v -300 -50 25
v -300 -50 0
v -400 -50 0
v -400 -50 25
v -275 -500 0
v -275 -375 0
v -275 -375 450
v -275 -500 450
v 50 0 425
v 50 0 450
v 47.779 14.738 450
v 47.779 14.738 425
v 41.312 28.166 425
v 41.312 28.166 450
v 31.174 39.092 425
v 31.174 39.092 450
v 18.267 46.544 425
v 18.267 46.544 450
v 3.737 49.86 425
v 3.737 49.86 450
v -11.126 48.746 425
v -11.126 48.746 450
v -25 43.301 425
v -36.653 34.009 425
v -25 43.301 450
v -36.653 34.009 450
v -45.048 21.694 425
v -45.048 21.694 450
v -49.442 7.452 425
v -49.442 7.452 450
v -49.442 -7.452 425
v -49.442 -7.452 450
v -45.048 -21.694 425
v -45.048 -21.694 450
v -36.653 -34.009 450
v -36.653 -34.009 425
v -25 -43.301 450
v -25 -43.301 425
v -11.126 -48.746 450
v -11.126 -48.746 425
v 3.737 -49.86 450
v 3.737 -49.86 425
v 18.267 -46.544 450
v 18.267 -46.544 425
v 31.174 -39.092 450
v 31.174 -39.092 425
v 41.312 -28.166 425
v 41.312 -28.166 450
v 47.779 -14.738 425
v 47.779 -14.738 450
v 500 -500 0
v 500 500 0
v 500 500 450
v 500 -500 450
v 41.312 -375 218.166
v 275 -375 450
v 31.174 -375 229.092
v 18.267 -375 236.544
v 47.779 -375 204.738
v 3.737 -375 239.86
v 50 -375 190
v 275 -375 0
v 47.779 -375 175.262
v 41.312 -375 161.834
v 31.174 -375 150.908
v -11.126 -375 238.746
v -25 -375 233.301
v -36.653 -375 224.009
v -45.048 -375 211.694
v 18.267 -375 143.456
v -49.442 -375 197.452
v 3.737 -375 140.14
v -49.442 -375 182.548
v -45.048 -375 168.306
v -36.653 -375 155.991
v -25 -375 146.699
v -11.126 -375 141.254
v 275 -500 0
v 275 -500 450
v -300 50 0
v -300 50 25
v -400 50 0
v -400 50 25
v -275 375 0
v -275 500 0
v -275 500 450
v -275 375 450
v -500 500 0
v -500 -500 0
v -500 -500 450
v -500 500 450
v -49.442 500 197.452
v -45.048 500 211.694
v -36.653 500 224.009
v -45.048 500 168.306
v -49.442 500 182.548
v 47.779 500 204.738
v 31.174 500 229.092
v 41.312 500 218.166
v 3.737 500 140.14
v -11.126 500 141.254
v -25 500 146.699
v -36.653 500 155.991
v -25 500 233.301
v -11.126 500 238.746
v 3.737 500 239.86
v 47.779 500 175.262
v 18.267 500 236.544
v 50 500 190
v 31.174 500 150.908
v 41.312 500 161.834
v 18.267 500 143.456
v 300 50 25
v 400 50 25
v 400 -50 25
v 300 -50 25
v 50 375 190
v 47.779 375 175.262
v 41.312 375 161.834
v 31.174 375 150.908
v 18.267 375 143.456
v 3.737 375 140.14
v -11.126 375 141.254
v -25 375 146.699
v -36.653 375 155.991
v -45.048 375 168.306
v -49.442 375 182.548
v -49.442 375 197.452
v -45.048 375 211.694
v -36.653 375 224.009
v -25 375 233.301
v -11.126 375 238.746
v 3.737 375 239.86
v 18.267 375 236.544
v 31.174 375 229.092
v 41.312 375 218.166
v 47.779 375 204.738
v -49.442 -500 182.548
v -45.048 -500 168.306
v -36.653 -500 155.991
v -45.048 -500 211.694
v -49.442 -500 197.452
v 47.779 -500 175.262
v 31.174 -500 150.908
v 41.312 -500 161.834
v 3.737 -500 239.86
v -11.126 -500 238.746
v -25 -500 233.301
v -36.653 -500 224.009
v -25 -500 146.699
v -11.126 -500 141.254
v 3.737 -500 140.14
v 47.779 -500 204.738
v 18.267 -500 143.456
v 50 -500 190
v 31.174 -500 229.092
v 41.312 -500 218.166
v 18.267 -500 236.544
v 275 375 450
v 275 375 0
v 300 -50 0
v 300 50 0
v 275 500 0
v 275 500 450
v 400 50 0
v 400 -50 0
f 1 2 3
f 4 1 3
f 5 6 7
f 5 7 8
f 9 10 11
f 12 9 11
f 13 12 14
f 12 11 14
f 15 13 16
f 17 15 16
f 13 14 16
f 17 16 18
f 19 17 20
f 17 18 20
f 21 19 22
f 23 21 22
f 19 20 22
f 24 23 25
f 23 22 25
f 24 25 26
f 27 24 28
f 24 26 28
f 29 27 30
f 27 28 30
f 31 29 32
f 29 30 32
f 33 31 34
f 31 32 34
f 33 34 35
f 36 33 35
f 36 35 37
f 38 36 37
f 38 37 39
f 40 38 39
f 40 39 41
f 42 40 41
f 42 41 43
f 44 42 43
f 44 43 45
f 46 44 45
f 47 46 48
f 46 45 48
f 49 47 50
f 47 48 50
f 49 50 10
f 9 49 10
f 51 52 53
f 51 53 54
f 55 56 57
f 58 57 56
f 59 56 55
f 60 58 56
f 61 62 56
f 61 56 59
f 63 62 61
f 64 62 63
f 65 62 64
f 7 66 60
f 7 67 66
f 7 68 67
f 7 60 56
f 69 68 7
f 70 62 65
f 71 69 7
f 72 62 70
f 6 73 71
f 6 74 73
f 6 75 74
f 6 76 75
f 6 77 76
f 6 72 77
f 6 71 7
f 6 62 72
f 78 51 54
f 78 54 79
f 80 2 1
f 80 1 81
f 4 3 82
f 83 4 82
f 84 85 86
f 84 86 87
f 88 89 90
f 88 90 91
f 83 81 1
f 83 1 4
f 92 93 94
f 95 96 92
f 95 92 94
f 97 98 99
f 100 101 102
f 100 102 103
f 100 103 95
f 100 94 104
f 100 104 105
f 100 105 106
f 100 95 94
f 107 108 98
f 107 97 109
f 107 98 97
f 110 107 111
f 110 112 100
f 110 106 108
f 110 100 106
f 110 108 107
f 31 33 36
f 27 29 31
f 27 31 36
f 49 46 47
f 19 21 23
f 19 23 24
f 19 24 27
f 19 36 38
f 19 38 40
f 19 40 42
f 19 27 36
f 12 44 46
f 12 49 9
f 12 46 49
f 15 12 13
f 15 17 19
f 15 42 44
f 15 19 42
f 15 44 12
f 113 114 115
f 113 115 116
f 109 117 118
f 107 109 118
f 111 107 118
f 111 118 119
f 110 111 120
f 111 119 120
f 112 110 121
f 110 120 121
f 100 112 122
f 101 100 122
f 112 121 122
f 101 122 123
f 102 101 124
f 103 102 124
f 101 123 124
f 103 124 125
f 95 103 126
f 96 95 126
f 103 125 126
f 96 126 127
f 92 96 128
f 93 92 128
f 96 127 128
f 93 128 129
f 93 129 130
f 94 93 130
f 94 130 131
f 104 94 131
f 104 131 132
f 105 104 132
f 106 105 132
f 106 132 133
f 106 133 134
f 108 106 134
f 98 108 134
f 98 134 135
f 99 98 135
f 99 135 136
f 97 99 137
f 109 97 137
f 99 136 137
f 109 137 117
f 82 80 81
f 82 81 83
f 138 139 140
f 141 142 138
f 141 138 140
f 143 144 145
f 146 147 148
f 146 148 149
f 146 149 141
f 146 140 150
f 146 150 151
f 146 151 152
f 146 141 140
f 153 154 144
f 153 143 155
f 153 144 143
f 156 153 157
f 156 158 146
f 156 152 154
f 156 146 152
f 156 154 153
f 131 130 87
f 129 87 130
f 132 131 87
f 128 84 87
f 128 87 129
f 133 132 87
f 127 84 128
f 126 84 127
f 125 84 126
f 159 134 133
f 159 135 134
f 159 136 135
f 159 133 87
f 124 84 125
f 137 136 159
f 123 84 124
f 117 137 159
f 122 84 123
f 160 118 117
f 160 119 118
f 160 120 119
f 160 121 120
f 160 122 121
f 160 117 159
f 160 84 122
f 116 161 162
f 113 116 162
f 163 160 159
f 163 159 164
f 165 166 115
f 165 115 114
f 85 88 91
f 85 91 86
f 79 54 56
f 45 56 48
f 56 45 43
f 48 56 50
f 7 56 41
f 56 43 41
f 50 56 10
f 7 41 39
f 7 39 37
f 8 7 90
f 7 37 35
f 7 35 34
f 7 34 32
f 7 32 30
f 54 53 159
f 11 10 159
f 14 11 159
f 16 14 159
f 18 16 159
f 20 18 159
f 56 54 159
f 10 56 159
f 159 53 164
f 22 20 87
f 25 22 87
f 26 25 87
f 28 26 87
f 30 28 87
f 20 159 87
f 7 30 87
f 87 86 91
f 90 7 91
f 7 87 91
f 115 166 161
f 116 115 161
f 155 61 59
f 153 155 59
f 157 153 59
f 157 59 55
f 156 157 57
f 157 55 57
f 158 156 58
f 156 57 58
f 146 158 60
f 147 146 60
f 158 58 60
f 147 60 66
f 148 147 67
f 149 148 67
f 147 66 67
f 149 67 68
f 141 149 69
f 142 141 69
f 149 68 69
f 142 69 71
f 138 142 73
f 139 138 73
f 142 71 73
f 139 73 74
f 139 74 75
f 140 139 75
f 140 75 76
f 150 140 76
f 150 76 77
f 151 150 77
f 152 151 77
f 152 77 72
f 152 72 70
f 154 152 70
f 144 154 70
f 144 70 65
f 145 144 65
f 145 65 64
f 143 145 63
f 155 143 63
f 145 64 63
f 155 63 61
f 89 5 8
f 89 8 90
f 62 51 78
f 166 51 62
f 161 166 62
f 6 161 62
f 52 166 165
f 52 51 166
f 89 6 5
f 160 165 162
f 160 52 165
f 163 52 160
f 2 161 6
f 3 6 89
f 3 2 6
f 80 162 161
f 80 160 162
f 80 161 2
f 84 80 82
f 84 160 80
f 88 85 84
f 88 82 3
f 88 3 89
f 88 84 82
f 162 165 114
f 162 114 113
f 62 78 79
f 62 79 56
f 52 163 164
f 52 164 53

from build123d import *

# Parameters (mm, degrees)
BOSS_EXTRUDE1_DEPTH = 450
SKETCH2_R           = 50
BOSS_EXTRUDE2_DEPTH = 125
SKETCH3_R           = 50
BOSS_EXTRUDE3_DEPTH = 125
SKETCH4_R           = 50
CUT_EXTRUDE1_DEPTH  = 25
SKETCH5_W           = 100
SKETCH5_H           = 100
CUT_EXTRUDE2_DEPTH  = 25


with BuildPart() as part:
    # Sketch1 → Boss-Extrude1 (new body)
    with BuildSketch(Plane.XY):
        Polygon((-275, 500), (-275, 375), (275, 375), (275, 500), (500, 500), (500, -500), (275, -500), (275, -375), (-275, -375), (-275, -500), (-500, -500), (-500, 500), align=None)
    extrude(amount=BOSS_EXTRUDE1_DEPTH)

    # Sketch2 → Boss-Extrude2 (add)
    with BuildSketch(Plane.XZ.offset(375)):
        with Locations((0, 190)):
            Circle(SKETCH2_R)
    extrude(amount=BOSS_EXTRUDE2_DEPTH)

    # Sketch3 → Boss-Extrude3 (add)
    with BuildSketch(Plane(origin=(0, 375, 0), x_dir=(1, 0, 0), z_dir=(0, 1, 0))):
        with Locations((0, -190)):
            Circle(SKETCH3_R)
    extrude(amount=BOSS_EXTRUDE3_DEPTH)

    # Sketch4 → Cut-Extrude1 (cut)
    with BuildSketch(Plane.XY.offset(450)):
        Circle(SKETCH4_R)
    extrude(amount=-CUT_EXTRUDE1_DEPTH, mode=Mode.SUBTRACT)

    # Sketch5 → Cut-Extrude2 (cut)
    with BuildSketch(Plane(origin=(0, 0, 0), x_dir=(-1, 0, 0), z_dir=(0, 0, -1))):
        with Locations((350, 0)):
            Rectangle(SKETCH5_W, SKETCH5_H)
        with Locations((-350, 0)):
            Rectangle(SKETCH5_W, SKETCH5_H)
    extrude(amount=-CUT_EXTRUDE2_DEPTH, mode=Mode.SUBTRACT)


solid = part.part
